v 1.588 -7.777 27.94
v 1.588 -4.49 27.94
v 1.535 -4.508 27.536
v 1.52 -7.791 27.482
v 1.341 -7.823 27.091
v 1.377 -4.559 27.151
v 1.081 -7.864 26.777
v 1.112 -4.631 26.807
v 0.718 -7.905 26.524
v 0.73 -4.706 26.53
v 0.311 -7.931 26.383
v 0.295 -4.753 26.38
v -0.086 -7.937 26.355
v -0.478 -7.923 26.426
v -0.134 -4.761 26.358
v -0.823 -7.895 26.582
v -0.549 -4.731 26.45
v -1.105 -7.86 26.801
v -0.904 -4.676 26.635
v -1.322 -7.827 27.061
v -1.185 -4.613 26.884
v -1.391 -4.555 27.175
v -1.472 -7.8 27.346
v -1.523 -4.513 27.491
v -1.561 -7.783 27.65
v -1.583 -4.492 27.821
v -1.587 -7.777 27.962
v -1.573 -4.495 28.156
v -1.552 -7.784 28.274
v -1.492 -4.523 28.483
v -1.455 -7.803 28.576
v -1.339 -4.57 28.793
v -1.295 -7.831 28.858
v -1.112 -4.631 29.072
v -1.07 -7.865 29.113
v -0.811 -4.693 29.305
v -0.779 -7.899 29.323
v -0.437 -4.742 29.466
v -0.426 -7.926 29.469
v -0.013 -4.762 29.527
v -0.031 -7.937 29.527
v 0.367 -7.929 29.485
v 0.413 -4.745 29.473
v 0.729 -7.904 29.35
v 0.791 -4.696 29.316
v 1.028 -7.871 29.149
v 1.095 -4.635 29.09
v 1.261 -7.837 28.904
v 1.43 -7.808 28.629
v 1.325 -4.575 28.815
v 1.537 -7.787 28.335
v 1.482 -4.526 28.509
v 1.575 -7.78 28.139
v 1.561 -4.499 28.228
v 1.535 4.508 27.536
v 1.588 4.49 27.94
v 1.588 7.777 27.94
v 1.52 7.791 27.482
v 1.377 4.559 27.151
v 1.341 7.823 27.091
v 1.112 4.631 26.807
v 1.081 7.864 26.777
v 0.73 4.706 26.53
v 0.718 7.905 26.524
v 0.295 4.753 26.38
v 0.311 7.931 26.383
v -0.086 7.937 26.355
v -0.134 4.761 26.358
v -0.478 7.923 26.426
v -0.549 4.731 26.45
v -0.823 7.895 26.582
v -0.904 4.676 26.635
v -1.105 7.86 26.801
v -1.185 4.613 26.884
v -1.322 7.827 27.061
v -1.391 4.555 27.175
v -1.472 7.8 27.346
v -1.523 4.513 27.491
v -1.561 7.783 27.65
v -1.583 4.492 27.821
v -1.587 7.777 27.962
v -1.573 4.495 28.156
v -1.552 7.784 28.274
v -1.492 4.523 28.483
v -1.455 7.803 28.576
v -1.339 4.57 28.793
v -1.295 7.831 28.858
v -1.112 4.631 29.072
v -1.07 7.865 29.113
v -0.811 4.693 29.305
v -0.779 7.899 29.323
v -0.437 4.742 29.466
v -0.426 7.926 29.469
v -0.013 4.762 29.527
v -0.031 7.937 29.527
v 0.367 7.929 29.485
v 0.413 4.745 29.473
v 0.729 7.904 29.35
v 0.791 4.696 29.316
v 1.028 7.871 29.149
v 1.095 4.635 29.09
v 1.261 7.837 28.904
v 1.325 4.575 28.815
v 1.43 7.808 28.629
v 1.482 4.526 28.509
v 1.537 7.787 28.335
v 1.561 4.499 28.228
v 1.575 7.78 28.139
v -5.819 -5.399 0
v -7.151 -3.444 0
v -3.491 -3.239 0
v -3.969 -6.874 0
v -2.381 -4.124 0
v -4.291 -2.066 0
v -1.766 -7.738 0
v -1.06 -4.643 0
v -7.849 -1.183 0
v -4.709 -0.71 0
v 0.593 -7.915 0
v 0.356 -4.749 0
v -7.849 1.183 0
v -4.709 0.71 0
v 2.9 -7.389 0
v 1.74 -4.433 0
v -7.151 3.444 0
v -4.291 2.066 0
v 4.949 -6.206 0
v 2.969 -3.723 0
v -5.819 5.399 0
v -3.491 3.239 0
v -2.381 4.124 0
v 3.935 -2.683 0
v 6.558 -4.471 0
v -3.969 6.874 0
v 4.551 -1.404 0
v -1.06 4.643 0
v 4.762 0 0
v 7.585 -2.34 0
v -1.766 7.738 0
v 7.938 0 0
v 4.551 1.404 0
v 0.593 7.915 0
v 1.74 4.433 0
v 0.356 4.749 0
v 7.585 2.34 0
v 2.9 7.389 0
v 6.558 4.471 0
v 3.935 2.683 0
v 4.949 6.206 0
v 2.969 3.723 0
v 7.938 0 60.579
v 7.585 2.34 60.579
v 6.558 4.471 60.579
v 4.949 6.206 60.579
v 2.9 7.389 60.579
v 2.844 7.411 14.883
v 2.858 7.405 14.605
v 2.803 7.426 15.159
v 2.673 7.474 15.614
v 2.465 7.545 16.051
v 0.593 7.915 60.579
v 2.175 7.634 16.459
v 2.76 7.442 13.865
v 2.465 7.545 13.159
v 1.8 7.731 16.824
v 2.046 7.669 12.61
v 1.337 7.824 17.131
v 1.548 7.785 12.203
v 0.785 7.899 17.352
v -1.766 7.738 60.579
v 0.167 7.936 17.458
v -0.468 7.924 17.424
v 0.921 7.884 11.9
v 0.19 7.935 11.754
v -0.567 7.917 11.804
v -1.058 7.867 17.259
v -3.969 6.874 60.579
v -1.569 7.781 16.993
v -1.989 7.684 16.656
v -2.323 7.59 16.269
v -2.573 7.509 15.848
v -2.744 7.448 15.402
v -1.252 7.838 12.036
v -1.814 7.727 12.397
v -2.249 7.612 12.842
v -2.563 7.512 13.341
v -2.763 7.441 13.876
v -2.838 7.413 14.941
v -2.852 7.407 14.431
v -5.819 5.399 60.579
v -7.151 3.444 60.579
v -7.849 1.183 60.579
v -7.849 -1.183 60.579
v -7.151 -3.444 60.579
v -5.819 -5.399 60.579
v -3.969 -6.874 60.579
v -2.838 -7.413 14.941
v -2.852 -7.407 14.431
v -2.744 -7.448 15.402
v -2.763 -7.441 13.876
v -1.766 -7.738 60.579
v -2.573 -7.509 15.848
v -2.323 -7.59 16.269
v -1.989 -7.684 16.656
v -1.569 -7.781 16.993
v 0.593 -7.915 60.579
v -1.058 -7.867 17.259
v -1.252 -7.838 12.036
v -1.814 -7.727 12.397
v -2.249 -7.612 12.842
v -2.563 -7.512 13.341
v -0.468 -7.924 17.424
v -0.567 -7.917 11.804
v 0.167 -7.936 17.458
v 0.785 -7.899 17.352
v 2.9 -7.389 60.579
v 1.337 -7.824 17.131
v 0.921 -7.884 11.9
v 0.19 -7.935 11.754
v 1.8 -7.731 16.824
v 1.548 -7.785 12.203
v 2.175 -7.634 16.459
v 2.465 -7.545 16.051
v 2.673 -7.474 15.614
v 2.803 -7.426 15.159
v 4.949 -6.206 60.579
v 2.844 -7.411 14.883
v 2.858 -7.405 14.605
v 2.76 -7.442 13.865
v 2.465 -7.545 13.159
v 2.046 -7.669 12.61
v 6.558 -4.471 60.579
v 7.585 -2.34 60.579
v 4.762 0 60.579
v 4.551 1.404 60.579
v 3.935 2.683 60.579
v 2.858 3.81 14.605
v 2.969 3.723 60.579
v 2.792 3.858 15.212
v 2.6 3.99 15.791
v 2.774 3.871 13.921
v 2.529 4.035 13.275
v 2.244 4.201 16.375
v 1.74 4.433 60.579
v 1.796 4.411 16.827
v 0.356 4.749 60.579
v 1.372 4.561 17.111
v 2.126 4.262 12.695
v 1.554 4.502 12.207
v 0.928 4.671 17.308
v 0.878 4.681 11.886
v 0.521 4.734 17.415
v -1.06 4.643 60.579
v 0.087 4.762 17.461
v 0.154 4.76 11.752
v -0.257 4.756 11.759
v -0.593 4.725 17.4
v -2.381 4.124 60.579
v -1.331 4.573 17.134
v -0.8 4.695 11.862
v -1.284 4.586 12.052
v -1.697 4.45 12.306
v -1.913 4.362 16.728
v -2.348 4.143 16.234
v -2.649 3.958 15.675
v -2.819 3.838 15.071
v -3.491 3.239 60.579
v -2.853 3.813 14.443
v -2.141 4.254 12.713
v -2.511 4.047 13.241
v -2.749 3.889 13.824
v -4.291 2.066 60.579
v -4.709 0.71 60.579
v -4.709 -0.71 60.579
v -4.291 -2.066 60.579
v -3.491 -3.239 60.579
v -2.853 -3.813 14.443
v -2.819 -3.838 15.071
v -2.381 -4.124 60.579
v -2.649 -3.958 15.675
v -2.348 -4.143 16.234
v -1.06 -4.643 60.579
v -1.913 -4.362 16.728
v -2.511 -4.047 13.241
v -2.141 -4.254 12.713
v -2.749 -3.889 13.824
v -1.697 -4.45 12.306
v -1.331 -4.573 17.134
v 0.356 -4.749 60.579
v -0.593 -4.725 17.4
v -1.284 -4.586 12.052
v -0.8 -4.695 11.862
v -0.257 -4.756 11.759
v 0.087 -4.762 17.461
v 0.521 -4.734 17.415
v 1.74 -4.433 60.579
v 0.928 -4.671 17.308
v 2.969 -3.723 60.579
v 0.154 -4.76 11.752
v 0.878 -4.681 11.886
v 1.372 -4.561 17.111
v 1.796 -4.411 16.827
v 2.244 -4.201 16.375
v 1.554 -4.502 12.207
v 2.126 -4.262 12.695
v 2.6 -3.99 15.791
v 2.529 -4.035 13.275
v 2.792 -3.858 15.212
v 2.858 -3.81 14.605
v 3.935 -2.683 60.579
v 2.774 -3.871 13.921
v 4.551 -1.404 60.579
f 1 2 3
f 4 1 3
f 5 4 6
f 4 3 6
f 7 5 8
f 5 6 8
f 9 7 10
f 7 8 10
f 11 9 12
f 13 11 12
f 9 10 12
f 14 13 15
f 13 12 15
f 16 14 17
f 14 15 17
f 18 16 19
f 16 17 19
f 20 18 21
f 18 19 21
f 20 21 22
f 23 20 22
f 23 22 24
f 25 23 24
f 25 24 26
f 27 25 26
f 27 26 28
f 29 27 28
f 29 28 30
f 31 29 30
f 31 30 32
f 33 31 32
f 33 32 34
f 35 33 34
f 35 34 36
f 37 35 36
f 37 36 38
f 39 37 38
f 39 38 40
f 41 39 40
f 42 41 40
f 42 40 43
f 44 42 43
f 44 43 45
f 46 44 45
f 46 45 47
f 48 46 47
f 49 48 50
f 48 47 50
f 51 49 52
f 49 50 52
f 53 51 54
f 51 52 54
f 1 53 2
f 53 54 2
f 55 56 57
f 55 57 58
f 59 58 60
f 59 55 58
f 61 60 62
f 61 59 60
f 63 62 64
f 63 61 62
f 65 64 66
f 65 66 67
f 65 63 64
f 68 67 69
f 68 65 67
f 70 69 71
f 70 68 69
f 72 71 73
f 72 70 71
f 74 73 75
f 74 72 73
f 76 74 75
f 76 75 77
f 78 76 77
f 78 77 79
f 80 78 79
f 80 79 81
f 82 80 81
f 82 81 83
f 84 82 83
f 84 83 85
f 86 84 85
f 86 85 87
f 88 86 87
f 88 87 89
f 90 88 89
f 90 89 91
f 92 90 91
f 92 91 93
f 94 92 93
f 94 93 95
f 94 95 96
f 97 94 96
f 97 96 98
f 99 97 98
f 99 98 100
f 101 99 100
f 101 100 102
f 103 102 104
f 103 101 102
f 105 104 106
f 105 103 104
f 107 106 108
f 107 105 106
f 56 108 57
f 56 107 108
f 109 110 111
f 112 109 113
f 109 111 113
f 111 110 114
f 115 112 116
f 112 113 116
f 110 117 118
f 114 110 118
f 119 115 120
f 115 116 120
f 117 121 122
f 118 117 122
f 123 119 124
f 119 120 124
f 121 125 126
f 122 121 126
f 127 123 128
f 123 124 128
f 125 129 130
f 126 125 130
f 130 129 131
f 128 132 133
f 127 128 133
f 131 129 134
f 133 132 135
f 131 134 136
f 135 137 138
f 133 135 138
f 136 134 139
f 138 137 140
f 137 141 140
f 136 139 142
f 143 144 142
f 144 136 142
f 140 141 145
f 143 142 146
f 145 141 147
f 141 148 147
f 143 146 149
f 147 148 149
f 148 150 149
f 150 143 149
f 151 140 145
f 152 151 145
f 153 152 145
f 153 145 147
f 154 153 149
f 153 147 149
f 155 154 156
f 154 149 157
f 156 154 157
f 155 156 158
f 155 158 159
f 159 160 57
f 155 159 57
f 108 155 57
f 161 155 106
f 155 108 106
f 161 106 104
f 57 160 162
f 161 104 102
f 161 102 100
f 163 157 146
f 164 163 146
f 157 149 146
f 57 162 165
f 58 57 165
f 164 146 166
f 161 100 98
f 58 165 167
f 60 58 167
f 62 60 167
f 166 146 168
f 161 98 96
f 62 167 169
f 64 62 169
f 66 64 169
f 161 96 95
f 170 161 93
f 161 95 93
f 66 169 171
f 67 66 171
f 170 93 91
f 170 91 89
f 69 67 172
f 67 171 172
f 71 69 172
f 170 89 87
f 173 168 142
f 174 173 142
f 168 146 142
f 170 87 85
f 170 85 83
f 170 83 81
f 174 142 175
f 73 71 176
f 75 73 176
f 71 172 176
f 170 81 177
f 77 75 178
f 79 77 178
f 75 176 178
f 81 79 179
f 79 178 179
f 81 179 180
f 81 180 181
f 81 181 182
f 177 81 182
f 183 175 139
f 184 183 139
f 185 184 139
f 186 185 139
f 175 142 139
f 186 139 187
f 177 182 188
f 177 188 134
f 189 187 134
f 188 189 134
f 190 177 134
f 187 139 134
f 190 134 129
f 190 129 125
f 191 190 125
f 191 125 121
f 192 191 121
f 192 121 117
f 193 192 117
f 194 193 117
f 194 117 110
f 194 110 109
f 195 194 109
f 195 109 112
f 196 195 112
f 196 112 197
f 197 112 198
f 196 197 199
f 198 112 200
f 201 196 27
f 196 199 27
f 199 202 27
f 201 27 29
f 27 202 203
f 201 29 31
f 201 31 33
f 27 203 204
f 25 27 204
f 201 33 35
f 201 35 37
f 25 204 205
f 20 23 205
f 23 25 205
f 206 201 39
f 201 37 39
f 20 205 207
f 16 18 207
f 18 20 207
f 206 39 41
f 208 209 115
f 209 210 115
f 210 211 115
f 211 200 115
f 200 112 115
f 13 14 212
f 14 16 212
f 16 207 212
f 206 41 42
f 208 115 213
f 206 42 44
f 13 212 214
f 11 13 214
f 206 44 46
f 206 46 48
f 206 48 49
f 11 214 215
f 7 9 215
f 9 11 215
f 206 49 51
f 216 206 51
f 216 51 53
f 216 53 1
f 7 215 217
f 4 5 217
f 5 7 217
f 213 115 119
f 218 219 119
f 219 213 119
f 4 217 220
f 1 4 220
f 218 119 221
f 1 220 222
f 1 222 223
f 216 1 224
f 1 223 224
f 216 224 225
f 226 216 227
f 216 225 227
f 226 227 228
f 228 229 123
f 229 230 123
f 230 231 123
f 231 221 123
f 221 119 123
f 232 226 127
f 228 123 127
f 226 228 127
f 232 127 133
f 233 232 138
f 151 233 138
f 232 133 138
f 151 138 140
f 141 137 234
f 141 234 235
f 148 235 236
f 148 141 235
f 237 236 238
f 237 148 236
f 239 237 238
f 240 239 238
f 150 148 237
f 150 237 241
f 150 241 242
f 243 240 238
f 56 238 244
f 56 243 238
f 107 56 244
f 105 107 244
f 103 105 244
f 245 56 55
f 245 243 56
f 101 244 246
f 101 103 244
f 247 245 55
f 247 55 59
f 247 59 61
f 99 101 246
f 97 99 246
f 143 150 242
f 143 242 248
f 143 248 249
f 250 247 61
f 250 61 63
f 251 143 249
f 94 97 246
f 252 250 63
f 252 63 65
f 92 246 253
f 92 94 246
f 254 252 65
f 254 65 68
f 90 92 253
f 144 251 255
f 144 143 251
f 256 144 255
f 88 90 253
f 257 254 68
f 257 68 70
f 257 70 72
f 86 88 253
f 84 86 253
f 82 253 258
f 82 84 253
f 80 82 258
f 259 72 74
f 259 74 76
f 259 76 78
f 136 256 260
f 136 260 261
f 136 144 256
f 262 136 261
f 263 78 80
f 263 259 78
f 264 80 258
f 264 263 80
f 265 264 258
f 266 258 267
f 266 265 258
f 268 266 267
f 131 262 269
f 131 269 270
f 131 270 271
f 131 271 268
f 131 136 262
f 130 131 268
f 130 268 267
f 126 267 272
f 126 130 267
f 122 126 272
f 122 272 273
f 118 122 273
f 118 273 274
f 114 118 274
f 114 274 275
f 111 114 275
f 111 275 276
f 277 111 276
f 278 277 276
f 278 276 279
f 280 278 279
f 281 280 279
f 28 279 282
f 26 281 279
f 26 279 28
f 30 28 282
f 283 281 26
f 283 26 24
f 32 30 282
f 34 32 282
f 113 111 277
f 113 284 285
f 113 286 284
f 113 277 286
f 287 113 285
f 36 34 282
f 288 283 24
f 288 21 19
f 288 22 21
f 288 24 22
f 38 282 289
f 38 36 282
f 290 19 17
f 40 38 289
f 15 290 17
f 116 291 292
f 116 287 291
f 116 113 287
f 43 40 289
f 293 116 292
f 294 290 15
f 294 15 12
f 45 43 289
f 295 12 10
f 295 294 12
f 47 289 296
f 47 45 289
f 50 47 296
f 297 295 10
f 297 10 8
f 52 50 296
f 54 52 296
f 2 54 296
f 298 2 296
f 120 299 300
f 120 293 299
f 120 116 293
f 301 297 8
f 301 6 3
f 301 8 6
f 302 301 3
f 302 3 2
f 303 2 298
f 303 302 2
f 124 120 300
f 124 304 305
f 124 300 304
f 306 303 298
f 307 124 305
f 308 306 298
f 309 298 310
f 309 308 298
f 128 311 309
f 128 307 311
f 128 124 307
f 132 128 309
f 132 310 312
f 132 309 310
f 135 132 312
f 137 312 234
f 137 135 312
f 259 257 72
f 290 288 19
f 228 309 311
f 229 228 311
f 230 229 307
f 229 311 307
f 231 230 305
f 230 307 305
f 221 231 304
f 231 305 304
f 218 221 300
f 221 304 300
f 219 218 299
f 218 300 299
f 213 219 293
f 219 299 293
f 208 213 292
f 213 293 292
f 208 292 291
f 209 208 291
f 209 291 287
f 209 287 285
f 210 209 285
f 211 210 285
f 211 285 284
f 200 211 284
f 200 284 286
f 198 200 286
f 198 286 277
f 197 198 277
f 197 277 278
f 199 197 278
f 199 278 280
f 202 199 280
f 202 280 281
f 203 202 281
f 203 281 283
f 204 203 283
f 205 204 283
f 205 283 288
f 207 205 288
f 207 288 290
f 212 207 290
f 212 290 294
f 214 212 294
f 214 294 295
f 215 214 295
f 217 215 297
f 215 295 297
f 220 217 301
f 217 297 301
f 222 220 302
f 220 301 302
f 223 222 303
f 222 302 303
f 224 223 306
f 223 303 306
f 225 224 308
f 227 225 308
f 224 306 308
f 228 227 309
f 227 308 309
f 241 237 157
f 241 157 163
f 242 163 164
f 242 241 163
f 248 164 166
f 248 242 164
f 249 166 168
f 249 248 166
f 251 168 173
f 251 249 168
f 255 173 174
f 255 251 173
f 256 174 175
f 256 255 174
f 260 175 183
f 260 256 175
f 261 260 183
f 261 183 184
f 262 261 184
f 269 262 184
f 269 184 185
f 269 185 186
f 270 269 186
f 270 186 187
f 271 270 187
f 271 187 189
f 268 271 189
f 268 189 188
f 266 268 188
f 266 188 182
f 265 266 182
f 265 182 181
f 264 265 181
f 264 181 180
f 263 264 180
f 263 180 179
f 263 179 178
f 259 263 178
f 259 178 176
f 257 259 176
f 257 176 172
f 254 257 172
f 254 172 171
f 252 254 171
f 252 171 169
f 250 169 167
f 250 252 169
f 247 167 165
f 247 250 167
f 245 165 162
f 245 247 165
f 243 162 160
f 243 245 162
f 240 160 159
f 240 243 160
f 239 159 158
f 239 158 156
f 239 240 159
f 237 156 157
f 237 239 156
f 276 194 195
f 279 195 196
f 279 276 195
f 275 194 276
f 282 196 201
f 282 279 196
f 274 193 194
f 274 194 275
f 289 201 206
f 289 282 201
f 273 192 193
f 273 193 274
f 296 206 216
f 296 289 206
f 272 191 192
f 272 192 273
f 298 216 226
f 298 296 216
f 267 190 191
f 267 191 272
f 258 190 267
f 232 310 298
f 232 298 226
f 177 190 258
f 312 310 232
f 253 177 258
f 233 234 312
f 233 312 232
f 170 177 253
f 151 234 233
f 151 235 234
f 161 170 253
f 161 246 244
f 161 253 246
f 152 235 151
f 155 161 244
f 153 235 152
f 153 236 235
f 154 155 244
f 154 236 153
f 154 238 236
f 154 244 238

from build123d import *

# Parameters (mm, degrees)
SKETCH1_R               = 7.9375
SKETCH1_R_2             = 4.7625
BOSS_EXTRUDE1_DEPTH     = 60.579
CUT_EXTRUDE1_DEPTH      = 60.579
CUT_EXTRUDE1_DEPTH_BACK = 60.579
SKETCH2_R               = 2.8575
CUT_EXTRUDE2_DEPTH      = 60.579
CUT_EXTRUDE2_DEPTH_BACK = 60.579
SKETCH3_R               = 1.5875


with BuildPart() as part:
    # Sketch1 → Boss-Extrude1 (new body)
    with BuildSketch(Plane.XY):
        Circle(SKETCH1_R)
        Circle(SKETCH1_R_2, mode=Mode.SUBTRACT)
    extrude(amount=BOSS_EXTRUDE1_DEPTH)

    # Sketch2 → Cut-Extrude1 (cut, two sides: drawn at the far end of the back side and taken through both)
    with BuildSketch(Plane(origin=(0, 0, 0), x_dir=(1, 0, 0), z_dir=(0, 1, 0)).offset(-CUT_EXTRUDE1_DEPTH_BACK)):
        with Locations((0, -14.605)):
            Circle(SKETCH2_R)
    extrude(amount=CUT_EXTRUDE1_DEPTH + CUT_EXTRUDE1_DEPTH_BACK, mode=Mode.SUBTRACT)

    # Sketch3 → Cut-Extrude2 (cut, two sides: drawn at the far end of the back side and taken through both)
    with BuildSketch(Plane(origin=(0, 0, 0), x_dir=(1, 0, 0), z_dir=(0, 1, 0)).offset(-CUT_EXTRUDE2_DEPTH_BACK)):
        with Locations((0, -27.94)):
            Circle(SKETCH3_R)
    extrude(amount=CUT_EXTRUDE2_DEPTH + CUT_EXTRUDE2_DEPTH_BACK, mode=Mode.SUBTRACT)


solid = part.part
